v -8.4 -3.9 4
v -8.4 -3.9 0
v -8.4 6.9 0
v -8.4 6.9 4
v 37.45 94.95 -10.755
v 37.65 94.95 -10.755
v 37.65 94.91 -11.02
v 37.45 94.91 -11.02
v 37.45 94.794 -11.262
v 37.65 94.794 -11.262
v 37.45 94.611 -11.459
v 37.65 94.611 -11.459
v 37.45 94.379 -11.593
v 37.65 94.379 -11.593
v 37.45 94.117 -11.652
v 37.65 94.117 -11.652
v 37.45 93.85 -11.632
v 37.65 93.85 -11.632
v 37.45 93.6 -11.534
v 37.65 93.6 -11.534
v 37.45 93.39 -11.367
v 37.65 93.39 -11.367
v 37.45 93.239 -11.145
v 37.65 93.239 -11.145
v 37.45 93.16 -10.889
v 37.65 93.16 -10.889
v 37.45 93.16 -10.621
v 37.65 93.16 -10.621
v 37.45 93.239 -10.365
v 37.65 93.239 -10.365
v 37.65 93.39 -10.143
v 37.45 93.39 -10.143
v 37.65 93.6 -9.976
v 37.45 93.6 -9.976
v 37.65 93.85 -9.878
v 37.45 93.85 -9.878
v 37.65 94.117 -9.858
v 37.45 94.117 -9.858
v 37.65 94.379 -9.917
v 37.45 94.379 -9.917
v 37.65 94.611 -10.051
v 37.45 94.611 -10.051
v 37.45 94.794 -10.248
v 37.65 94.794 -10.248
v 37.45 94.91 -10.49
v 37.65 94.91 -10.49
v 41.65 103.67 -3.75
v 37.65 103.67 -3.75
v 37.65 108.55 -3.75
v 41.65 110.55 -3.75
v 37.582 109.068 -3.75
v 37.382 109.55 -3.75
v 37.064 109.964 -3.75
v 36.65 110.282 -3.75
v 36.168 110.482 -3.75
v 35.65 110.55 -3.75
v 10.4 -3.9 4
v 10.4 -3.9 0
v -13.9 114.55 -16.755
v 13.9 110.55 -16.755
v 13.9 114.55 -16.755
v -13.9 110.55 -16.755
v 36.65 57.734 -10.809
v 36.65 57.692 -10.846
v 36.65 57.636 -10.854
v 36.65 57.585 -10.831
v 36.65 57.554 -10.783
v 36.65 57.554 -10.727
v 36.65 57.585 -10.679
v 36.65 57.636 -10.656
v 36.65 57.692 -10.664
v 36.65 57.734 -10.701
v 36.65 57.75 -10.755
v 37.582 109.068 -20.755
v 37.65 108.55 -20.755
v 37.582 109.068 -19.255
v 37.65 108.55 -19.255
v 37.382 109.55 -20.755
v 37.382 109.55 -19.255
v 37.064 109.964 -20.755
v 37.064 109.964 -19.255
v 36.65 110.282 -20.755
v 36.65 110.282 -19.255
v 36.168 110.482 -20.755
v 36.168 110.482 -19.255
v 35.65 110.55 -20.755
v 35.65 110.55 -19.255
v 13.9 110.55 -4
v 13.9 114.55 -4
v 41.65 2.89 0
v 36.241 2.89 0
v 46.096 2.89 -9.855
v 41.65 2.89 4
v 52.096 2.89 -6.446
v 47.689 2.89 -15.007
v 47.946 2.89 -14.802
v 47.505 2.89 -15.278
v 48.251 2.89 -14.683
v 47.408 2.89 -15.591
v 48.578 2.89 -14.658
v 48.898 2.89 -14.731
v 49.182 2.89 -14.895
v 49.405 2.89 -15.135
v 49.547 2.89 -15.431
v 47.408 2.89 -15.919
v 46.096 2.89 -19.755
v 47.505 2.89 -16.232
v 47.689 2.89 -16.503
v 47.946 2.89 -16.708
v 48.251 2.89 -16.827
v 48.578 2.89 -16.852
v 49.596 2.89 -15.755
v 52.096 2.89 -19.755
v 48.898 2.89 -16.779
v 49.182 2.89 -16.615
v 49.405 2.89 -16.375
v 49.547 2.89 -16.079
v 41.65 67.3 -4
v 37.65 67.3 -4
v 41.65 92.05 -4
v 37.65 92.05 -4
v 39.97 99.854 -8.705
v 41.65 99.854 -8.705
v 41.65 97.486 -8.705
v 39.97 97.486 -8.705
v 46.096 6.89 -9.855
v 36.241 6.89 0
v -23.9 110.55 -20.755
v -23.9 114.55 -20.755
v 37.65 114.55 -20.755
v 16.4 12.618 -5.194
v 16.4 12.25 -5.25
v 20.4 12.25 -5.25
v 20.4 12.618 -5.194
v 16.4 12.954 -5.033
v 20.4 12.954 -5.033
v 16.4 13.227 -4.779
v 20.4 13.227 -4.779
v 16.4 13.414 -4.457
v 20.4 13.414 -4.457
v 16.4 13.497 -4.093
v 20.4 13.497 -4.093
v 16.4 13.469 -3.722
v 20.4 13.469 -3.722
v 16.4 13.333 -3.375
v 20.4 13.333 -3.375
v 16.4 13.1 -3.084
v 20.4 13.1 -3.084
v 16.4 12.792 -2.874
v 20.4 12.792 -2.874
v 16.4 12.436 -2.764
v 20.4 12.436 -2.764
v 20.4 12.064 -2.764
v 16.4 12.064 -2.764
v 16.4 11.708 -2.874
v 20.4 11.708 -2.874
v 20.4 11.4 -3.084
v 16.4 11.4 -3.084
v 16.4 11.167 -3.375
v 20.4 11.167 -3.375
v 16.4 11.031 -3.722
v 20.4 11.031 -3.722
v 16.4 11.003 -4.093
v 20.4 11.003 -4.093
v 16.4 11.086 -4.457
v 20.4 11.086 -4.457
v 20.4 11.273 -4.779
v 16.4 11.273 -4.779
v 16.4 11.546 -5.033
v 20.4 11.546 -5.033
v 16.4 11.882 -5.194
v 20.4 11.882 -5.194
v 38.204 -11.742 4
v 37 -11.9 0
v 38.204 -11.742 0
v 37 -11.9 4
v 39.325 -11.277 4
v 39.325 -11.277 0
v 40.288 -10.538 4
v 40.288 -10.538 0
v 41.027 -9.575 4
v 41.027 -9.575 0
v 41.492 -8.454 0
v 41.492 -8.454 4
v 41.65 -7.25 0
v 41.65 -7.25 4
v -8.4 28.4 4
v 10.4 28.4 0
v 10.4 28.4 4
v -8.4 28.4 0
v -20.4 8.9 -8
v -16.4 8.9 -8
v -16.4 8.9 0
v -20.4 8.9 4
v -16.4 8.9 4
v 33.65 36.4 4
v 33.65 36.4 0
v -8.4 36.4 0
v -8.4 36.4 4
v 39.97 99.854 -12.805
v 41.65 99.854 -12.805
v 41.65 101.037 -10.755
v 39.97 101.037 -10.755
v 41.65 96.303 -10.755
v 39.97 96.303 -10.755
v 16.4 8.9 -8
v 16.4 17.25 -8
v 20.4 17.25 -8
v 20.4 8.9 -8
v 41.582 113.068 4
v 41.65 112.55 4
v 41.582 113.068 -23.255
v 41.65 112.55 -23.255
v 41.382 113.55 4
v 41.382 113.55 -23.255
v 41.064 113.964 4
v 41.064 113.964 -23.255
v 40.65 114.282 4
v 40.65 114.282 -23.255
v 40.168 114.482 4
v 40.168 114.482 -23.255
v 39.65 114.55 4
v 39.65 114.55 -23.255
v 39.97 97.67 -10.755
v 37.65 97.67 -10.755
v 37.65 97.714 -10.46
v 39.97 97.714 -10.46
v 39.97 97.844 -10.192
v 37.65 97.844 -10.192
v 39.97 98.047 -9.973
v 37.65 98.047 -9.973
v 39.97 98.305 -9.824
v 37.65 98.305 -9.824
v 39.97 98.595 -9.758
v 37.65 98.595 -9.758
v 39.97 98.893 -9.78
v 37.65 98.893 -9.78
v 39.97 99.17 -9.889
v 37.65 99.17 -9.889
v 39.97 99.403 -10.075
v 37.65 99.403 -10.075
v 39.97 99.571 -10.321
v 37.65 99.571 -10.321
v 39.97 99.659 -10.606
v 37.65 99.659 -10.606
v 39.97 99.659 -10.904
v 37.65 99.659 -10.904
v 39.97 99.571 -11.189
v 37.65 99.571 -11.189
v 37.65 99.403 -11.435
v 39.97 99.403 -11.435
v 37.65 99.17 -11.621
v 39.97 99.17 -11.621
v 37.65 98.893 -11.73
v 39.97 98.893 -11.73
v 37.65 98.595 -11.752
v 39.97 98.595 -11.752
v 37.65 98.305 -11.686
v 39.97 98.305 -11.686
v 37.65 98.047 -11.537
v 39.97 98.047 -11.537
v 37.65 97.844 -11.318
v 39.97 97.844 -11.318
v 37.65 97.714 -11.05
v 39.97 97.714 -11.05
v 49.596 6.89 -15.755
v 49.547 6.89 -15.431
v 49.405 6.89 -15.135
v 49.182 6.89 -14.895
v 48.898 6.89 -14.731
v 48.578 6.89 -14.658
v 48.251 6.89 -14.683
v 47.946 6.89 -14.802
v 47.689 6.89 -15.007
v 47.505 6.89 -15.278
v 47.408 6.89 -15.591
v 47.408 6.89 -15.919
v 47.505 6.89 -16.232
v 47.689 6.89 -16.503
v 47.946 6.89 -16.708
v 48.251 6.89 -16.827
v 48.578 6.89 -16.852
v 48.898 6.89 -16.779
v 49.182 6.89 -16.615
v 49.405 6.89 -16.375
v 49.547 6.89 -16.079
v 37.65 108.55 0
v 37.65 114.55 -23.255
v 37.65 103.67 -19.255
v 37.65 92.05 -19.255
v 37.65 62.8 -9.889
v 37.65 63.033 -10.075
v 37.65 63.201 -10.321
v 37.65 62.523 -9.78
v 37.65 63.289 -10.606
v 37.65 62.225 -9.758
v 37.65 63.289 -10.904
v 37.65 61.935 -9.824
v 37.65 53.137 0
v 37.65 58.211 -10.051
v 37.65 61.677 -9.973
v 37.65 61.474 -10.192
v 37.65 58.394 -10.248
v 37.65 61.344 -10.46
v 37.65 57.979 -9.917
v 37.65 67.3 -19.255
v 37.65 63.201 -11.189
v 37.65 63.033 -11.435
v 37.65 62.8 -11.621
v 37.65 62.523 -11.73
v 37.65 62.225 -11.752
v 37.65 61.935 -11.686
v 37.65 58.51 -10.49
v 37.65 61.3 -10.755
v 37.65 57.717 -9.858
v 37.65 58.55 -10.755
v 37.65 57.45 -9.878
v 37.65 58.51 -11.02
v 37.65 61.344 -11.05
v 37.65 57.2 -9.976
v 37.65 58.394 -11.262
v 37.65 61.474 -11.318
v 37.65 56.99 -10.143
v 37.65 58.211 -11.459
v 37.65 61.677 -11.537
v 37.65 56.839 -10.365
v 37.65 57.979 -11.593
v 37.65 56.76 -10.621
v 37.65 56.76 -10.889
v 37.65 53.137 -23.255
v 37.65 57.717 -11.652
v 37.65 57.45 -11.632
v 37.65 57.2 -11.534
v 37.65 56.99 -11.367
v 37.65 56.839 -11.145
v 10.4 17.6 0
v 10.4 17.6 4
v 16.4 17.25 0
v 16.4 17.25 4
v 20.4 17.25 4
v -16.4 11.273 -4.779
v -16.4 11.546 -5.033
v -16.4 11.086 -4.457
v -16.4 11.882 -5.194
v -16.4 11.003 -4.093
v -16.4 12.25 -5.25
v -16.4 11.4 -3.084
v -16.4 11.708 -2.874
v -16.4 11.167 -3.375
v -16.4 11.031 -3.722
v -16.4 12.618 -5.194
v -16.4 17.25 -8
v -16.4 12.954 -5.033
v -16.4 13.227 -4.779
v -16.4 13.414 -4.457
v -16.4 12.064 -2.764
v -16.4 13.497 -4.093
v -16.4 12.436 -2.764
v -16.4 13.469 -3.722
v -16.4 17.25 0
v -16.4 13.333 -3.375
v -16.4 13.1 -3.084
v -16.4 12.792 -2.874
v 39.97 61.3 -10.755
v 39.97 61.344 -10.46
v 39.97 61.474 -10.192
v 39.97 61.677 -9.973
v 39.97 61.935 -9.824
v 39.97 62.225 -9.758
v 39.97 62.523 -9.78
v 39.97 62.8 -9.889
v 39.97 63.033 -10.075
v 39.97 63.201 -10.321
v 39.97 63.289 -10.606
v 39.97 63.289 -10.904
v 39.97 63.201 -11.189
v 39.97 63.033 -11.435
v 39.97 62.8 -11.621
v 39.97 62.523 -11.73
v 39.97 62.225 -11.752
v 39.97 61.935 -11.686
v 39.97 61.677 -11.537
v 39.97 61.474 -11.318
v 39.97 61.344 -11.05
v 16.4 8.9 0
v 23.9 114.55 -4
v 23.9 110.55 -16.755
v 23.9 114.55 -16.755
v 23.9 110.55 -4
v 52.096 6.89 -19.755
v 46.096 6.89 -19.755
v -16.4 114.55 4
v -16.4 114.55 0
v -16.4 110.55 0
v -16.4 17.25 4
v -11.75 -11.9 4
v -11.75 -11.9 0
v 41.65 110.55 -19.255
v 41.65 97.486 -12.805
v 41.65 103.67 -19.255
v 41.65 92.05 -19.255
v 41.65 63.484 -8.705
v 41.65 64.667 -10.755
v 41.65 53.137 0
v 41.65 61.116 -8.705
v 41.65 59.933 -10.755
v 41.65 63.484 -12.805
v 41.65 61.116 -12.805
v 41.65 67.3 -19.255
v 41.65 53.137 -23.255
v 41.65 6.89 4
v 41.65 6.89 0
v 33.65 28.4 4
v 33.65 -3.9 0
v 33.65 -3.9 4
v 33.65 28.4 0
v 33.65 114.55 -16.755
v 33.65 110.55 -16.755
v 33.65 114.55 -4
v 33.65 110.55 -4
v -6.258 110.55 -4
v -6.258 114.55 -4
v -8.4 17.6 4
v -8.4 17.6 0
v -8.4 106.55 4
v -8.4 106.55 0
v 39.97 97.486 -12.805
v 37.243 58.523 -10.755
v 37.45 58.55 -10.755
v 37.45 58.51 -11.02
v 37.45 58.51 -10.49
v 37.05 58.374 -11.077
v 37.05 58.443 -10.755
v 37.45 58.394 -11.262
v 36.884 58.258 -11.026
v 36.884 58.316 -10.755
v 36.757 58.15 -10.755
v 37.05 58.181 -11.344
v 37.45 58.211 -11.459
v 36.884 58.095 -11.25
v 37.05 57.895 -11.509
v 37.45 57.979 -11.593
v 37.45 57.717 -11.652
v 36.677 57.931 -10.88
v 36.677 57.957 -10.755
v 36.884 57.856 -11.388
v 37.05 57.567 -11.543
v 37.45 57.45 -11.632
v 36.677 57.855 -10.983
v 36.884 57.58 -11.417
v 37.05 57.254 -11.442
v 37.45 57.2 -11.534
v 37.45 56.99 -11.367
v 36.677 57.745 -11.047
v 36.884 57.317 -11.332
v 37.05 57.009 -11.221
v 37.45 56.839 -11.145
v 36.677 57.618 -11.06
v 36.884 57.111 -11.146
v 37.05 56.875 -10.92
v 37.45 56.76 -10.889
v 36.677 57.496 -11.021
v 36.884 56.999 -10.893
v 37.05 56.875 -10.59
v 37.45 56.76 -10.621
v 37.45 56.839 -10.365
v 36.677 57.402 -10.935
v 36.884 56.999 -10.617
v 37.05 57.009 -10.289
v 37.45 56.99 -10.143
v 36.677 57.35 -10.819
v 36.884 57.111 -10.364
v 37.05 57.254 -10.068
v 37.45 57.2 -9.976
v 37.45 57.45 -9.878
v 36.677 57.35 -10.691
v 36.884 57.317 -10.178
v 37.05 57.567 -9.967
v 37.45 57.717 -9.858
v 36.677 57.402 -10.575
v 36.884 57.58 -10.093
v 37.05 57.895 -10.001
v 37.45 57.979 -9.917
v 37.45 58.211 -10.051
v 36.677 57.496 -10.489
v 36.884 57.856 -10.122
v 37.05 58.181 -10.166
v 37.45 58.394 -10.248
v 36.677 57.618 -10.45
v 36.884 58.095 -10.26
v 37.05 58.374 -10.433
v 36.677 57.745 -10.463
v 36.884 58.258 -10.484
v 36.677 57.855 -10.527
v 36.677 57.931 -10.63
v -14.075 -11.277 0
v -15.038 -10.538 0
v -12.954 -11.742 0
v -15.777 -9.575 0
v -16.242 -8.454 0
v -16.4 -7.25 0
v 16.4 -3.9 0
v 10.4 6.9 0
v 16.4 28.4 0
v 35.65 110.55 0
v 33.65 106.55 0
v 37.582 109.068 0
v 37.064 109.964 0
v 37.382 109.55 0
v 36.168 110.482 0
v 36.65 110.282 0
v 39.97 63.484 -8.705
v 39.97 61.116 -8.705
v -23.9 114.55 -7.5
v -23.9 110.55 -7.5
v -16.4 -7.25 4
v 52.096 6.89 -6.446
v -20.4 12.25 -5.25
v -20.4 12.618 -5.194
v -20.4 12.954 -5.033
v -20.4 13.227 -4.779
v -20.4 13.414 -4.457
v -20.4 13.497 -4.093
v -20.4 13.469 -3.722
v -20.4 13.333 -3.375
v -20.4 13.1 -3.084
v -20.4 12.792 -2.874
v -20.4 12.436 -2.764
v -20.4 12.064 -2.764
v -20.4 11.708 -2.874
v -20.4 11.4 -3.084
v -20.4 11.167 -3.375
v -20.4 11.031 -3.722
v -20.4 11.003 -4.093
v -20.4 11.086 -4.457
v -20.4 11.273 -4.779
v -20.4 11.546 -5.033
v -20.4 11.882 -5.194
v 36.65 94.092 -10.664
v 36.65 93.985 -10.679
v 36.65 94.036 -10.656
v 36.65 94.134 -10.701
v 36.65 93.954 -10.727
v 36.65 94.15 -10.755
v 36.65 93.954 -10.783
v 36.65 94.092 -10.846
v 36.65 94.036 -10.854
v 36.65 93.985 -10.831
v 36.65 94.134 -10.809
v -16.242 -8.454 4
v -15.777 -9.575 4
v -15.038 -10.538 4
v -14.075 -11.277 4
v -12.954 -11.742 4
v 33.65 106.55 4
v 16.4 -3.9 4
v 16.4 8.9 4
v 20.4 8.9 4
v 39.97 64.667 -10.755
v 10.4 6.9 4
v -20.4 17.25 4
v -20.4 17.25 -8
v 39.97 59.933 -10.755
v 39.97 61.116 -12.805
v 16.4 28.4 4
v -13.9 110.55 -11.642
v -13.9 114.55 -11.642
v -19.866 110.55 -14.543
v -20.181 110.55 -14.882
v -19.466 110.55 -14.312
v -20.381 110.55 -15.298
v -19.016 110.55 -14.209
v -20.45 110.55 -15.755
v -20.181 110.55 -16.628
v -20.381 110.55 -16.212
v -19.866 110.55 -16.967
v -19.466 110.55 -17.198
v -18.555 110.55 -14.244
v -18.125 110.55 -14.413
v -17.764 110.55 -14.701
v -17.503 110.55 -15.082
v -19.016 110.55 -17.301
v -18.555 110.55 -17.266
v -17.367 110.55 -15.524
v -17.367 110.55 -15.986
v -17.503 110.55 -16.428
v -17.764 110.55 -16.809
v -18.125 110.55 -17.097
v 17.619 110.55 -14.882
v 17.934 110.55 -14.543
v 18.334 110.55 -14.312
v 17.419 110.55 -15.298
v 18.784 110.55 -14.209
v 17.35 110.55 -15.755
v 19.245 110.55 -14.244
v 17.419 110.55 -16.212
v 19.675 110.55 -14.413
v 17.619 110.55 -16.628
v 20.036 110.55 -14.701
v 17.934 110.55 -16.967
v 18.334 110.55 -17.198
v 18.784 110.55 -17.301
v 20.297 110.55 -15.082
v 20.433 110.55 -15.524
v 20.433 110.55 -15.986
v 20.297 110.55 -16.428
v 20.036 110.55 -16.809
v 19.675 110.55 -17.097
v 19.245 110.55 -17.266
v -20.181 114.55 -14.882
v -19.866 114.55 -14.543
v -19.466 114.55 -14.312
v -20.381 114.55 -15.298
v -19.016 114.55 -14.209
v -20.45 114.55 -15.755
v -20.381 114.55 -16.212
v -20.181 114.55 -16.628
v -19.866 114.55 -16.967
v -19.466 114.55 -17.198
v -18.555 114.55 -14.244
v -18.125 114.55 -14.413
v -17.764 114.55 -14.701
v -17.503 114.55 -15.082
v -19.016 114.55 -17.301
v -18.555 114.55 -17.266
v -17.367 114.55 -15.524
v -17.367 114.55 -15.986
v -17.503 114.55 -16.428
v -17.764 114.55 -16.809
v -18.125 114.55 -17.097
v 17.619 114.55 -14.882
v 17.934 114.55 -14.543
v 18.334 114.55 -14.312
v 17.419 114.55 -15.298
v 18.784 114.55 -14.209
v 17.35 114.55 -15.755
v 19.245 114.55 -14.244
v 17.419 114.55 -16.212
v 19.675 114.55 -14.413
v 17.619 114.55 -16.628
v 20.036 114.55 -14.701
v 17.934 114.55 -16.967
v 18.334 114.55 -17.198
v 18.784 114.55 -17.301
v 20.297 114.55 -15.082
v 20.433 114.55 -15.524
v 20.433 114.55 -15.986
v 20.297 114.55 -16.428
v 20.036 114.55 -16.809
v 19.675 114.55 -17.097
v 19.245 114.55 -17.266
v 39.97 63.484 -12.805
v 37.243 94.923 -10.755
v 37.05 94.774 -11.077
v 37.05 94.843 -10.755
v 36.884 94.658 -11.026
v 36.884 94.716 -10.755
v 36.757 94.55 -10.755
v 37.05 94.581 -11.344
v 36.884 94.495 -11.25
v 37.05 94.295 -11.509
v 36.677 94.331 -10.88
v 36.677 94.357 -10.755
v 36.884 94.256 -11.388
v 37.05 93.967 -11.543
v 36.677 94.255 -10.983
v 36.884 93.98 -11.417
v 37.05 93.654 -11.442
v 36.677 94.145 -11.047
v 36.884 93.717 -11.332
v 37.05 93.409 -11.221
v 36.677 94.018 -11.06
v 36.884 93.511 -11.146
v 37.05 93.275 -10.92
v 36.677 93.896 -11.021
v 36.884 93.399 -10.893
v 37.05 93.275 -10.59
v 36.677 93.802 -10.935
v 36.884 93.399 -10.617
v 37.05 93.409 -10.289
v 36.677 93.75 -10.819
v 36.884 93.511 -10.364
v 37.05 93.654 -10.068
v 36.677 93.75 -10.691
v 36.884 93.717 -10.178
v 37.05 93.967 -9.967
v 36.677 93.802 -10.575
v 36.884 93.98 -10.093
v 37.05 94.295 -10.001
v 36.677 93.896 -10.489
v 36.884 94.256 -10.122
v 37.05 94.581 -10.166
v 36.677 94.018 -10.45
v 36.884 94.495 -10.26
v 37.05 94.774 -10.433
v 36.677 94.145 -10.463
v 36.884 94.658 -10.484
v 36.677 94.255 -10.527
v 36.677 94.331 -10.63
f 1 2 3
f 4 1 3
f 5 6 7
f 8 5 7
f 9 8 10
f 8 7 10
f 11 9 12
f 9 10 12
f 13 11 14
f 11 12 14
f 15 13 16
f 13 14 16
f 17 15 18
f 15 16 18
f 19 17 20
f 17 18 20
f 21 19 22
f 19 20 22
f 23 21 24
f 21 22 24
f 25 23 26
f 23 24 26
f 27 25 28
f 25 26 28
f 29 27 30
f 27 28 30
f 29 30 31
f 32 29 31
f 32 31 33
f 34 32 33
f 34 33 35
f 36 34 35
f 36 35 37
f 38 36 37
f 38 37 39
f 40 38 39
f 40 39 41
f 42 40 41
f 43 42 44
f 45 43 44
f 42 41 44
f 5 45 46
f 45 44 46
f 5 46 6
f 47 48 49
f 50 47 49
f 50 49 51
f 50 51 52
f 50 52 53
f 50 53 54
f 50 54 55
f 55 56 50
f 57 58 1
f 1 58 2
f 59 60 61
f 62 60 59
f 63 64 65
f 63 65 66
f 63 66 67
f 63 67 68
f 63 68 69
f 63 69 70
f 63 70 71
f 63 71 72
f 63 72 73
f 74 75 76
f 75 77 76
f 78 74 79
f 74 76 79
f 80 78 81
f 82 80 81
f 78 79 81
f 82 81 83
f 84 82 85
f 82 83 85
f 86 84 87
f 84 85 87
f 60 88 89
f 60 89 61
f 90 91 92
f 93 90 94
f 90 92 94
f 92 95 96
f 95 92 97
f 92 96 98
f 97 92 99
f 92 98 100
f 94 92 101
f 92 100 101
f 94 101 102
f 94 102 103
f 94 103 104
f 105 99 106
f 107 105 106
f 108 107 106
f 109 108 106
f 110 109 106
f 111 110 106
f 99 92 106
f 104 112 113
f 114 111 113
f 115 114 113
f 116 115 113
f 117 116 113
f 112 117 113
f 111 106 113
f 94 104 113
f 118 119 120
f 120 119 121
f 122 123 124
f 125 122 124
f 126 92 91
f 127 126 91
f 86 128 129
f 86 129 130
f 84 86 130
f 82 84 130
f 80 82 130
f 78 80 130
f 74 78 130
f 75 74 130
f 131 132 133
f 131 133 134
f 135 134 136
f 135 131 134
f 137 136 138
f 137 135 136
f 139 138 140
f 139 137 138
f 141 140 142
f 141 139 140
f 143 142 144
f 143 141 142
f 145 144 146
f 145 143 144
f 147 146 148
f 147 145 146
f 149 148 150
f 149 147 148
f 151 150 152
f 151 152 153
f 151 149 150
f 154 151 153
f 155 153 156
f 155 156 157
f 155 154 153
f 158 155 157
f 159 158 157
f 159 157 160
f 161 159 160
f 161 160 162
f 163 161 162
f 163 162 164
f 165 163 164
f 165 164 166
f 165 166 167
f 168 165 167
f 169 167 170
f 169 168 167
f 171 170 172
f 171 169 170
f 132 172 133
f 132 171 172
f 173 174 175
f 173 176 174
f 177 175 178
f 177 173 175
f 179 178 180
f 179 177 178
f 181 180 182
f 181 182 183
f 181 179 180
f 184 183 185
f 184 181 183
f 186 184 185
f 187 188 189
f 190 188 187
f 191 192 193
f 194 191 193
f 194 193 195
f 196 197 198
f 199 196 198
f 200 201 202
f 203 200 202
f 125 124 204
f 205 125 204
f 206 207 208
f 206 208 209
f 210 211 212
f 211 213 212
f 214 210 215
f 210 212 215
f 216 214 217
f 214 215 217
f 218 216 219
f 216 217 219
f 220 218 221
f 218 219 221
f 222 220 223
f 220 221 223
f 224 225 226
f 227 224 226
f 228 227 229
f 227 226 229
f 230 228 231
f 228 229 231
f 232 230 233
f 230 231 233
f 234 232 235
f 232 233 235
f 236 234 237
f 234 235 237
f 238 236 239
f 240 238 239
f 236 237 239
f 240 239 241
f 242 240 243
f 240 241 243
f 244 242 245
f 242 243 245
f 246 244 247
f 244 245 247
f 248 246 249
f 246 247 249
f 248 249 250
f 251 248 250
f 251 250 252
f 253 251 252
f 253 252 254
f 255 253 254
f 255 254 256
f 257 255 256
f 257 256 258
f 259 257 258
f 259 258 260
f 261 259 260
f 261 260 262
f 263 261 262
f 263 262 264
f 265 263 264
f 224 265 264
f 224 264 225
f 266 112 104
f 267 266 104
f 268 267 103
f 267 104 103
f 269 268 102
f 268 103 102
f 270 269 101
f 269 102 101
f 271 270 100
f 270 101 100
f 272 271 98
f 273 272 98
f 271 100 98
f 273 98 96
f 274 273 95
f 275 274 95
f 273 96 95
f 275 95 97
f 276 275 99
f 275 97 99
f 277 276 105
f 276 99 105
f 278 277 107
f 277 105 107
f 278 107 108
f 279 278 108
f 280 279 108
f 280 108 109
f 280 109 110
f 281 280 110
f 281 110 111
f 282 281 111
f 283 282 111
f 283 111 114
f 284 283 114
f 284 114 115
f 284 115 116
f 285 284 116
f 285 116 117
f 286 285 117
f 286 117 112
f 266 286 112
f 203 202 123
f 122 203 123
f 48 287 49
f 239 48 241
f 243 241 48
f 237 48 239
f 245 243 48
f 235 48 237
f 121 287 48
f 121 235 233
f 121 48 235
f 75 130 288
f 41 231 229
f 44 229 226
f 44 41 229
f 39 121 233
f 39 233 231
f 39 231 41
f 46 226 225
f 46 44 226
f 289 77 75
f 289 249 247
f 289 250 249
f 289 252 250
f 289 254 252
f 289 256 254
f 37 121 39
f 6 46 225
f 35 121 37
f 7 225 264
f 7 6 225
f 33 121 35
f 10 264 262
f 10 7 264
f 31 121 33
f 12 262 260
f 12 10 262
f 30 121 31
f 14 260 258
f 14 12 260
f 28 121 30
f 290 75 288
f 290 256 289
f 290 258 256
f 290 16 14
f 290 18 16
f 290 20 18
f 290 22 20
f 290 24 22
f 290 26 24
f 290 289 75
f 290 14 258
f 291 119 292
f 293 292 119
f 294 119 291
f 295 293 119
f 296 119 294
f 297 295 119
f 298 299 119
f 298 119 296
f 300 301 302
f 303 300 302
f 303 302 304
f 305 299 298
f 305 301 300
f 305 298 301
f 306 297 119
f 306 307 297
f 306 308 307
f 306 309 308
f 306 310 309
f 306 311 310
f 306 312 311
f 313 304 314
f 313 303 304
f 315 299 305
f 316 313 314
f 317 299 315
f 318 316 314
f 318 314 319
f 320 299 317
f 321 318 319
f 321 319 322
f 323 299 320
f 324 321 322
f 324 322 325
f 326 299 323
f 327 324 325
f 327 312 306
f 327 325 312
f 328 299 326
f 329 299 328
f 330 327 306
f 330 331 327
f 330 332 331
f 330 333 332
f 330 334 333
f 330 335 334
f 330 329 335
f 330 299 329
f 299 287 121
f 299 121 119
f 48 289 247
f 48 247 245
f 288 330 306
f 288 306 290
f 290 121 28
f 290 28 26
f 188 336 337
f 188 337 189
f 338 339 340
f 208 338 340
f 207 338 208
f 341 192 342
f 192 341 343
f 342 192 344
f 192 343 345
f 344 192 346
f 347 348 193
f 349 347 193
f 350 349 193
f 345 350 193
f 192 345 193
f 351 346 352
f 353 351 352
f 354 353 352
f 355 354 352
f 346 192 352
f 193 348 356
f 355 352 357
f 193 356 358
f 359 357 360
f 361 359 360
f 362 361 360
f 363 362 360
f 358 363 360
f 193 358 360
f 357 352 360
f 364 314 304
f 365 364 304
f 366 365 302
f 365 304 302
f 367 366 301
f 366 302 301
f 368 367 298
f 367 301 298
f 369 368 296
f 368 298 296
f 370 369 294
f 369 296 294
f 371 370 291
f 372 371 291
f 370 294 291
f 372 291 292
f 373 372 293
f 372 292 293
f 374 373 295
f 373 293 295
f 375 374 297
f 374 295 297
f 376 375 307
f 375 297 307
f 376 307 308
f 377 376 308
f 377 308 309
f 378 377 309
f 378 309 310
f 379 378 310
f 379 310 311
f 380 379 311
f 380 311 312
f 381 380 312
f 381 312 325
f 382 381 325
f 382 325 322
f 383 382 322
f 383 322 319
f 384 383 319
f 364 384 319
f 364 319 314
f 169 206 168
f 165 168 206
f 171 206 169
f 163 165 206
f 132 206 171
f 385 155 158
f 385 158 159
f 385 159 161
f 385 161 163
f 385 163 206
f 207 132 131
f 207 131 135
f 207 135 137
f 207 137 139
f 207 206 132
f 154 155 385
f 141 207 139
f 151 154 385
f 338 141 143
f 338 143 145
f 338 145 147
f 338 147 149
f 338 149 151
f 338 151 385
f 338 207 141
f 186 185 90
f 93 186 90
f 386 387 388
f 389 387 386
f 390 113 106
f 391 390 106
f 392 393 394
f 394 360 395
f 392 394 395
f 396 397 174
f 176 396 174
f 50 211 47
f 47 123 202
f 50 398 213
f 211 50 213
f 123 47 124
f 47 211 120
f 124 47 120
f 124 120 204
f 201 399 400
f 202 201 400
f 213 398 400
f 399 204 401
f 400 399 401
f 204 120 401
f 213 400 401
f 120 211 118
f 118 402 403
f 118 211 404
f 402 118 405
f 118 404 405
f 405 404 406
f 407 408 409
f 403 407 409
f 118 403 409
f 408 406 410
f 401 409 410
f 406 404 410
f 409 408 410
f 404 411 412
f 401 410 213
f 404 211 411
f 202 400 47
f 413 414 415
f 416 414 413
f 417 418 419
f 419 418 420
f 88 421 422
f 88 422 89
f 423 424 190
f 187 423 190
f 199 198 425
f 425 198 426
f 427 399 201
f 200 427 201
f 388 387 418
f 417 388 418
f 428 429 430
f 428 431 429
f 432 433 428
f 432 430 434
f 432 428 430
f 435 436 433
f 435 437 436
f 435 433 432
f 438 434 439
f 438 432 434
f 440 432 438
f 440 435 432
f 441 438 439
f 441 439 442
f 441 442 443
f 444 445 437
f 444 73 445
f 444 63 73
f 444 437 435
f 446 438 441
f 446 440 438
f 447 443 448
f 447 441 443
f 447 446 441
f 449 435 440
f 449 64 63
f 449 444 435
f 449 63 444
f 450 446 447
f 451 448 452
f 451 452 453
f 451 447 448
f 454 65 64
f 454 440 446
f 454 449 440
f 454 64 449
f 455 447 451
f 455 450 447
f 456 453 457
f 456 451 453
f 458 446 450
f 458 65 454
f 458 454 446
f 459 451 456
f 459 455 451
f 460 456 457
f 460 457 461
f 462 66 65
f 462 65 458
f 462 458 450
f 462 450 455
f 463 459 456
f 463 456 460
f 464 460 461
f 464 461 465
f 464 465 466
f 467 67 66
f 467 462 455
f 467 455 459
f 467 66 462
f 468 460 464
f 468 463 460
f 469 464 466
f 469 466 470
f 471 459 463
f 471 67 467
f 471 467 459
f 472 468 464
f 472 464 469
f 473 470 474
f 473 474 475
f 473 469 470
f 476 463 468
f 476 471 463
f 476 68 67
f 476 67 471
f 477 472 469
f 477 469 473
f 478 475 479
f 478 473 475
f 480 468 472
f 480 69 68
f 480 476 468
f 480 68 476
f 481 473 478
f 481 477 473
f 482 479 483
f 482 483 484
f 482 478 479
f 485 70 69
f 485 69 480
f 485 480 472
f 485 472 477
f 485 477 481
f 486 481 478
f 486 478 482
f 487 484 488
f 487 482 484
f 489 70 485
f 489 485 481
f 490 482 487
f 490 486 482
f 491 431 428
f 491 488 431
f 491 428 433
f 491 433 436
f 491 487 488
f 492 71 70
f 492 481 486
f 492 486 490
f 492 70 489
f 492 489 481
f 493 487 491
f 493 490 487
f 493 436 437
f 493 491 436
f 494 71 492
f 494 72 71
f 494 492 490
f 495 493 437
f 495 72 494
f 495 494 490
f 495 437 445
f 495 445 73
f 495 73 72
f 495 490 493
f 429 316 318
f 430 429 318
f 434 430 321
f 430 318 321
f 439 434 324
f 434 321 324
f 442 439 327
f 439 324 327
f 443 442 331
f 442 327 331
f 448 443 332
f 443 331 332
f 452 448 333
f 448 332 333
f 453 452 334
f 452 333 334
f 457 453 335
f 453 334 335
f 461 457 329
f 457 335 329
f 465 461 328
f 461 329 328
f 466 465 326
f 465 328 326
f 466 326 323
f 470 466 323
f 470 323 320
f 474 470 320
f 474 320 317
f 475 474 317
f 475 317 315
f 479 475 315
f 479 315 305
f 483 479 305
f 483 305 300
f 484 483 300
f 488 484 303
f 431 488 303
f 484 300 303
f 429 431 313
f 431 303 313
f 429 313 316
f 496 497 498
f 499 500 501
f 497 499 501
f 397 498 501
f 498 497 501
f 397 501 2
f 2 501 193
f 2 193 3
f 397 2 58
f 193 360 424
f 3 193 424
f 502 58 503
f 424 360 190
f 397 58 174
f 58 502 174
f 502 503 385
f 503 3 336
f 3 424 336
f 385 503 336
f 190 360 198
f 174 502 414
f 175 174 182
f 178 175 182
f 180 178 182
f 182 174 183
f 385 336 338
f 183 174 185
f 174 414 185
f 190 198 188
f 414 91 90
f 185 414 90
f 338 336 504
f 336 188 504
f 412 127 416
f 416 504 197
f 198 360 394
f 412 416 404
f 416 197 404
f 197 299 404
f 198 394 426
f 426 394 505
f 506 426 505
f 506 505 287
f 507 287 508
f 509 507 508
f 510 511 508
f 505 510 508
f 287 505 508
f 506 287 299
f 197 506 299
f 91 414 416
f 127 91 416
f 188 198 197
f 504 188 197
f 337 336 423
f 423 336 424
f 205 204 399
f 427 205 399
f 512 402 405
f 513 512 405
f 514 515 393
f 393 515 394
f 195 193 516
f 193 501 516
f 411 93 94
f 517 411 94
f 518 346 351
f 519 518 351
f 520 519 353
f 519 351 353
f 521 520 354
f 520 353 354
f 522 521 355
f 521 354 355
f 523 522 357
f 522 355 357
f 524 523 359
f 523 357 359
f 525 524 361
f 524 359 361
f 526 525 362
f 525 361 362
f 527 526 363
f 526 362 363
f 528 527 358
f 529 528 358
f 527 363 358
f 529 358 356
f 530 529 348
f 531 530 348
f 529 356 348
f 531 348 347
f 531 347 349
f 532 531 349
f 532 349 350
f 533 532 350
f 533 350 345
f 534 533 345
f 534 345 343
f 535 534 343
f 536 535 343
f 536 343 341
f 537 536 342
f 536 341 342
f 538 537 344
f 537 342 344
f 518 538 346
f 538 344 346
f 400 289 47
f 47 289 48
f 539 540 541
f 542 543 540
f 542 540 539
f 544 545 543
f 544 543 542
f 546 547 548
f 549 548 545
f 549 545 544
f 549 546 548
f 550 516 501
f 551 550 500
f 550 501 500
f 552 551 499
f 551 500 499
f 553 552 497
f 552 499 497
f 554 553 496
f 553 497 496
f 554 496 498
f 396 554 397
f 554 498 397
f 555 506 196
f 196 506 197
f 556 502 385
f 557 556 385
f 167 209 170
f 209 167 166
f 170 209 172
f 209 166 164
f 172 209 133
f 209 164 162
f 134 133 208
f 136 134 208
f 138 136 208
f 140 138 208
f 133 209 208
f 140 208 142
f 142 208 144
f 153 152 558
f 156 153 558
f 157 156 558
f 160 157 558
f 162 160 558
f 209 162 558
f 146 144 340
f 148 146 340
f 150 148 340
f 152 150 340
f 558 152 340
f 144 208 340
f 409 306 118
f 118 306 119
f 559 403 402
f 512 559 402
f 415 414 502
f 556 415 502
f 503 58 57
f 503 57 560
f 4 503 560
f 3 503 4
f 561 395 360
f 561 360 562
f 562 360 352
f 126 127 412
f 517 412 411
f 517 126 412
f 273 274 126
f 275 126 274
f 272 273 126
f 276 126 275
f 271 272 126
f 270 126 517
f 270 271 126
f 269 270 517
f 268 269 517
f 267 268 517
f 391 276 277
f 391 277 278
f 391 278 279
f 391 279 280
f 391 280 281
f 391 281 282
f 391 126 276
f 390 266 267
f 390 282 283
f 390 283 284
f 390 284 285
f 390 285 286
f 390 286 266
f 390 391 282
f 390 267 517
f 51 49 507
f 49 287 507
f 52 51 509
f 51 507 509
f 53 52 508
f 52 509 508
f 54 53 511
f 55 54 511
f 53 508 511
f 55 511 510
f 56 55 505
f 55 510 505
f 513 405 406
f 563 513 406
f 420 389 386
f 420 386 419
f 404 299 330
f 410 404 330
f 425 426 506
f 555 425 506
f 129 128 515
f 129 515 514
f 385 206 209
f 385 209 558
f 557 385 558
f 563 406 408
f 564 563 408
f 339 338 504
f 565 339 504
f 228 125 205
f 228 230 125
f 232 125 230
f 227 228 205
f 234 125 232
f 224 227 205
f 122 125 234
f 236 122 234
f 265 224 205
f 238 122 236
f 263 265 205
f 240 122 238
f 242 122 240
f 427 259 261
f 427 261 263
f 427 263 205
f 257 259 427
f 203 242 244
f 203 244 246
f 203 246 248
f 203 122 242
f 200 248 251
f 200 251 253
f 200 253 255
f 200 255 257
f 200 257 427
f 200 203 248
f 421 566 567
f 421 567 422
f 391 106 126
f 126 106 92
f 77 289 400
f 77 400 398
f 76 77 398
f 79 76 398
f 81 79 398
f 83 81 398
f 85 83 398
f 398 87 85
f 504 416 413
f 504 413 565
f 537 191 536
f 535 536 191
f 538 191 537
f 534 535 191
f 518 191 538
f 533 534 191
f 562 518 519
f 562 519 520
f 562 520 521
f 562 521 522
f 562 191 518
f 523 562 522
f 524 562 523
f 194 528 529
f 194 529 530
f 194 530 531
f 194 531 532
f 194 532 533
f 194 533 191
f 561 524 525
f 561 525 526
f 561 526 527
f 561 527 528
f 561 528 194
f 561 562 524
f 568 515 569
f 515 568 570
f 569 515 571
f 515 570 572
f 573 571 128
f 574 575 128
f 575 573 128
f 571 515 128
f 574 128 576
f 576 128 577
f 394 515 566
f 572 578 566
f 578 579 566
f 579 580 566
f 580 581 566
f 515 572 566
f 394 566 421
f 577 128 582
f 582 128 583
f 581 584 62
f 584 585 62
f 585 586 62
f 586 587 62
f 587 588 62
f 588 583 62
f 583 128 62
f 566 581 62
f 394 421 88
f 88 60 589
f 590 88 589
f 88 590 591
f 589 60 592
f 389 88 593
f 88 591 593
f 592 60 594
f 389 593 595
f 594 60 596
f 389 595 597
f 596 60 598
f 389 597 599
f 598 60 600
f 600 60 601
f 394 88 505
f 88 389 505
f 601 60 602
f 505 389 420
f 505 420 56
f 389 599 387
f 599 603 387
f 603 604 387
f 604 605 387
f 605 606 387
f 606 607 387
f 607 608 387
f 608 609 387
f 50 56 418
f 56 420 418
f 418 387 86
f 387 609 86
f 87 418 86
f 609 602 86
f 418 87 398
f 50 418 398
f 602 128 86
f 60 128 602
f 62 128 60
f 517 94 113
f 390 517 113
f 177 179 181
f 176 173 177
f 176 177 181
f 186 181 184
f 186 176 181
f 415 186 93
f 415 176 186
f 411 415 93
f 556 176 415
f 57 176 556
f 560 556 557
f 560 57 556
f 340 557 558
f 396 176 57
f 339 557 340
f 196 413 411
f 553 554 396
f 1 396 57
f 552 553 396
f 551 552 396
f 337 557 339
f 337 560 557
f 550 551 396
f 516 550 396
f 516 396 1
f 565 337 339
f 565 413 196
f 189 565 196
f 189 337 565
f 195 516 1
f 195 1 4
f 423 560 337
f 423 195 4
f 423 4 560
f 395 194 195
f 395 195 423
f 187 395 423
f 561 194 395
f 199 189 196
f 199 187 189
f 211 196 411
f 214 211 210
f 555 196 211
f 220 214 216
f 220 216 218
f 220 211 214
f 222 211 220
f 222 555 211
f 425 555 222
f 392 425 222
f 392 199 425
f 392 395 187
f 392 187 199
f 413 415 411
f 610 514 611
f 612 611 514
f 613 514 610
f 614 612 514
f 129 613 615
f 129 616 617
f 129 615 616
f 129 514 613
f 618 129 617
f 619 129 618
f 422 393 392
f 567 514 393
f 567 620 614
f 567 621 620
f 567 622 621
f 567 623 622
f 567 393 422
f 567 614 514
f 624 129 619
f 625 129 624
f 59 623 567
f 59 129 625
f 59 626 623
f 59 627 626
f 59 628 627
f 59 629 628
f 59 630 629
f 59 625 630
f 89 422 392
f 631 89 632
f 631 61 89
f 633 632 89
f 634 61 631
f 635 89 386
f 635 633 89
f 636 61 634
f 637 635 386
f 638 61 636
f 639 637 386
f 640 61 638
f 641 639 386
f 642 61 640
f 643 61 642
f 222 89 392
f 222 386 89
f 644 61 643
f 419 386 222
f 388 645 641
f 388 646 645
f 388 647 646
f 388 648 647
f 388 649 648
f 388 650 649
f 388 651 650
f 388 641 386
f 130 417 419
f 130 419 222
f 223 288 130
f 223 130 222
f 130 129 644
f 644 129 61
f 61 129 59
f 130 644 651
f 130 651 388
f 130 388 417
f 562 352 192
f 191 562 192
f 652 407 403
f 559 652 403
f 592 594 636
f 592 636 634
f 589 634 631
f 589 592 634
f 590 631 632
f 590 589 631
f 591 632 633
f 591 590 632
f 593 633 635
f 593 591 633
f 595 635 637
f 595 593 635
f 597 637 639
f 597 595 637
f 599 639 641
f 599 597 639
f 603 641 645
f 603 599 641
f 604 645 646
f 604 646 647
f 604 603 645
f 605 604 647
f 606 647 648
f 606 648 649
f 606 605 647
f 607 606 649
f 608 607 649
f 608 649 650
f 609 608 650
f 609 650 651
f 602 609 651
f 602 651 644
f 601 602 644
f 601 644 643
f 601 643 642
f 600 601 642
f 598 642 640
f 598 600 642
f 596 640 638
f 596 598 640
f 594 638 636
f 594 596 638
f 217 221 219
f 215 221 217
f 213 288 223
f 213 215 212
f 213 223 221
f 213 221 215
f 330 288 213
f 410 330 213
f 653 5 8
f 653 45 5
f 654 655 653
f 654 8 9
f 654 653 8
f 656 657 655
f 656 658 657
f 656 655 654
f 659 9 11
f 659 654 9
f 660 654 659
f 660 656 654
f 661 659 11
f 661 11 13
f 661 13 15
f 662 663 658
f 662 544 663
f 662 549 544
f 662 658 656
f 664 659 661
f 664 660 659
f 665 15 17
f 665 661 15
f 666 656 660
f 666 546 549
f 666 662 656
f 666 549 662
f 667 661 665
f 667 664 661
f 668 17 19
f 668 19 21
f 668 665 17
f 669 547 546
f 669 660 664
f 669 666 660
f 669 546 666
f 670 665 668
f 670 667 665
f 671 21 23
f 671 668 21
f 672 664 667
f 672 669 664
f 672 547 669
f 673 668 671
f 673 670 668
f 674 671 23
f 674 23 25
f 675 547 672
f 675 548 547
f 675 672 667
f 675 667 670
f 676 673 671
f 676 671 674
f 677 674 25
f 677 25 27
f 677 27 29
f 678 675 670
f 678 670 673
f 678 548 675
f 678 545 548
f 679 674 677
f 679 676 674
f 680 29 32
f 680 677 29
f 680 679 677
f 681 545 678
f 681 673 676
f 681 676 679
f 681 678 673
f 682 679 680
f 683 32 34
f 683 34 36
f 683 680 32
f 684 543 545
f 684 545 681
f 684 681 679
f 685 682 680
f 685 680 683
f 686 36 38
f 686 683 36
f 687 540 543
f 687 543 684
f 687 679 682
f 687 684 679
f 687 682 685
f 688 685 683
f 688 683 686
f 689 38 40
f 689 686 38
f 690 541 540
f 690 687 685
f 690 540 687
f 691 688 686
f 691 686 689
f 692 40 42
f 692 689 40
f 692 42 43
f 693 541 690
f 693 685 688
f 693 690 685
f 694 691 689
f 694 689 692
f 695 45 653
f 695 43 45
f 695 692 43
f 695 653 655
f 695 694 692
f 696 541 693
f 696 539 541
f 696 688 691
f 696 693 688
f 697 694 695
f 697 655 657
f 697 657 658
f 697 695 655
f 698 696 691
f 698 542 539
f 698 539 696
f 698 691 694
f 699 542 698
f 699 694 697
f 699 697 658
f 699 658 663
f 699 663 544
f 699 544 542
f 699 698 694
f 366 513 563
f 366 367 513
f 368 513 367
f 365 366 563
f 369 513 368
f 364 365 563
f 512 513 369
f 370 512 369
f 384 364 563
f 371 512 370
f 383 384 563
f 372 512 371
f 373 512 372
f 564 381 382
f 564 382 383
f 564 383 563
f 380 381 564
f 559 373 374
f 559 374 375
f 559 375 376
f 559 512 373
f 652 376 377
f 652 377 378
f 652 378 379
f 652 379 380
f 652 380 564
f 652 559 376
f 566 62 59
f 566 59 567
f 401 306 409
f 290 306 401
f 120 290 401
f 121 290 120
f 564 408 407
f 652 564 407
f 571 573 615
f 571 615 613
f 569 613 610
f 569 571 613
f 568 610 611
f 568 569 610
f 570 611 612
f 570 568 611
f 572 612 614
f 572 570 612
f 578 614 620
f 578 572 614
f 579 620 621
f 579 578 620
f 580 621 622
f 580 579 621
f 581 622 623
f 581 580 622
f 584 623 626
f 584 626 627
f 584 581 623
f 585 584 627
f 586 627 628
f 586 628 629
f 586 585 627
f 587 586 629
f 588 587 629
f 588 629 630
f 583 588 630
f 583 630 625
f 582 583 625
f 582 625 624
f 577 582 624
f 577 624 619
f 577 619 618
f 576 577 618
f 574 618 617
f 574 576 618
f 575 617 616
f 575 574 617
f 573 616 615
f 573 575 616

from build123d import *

# Parameters (mm, degrees)
EXTRUDE_5_DEPTH      = 4
SKETCH_5_W           = 65.55
SKETCH_5_H           = 20.755
SKETCH_5_R           = 1.55
EXTRUDE_6_DEPTH      = 4
SKETCH_7_W           = 65.55
SKETCH_7_H           = 126.45
EXTRUDE_8_DEPTH      = 4
SKETCH_11_W          = 17.25
SKETCH_11_H          = 32.3
SKETCH_11_W_2        = 18.8
SKETCH_11_H_2        = 10.8
CUT_EXTRUDE_3_DEPTH  = 125.085535116
EXTRUDE_9_DEPTH      = 4
CUT_EXTRUDE_4_DEPTH  = 10
SKETCH_14_W          = 9.75
SKETCH_14_H          = 12.755
CUT_EXTRUDE_5_DEPTH  = 10
SKETCH_16_W          = 15.255
SKETCH_16_H          = 24.75
SKETCH_16_W_2        = 15.505
SKETCH_16_H_2        = 6.88
CUT_EXTRUDE_6_DEPTH  = 133.101854737
EXTRUDE_2_DEPTH      = 4
CUT_EXTRUDE_7_REACH  = 127.39
SKETCH_19_R          = 1.1
SKETCH_21_W          = 4
SKETCH_21_H          = 2.5
EXTRUDE_11_DEPTH     = 4
FILLET_2_R           = 2
FILLET_3_R           = 4.65
SKETCH_24_R          = 1
CUT_EXTRUDE_10_DEPTH = 133.101854737
SKETCH_25_R          = 0.9
EXTRUDE_12_DEPTH     = 1
FILLET_4_R           = 0.8
CUT_EXTRUDE_11_DEPTH = 1.68


with BuildPart() as part:
    # 草图4 → 凸台-拉伸5 (new body)
    with BuildSketch(Plane(origin=(37.65, 0, 0), x_dir=(0, 0, -1), z_dir=(1, 0, 0))):
        Polygon((23.255, 110.55), (19.873443934, 110.55), (11.636556066, 110.55), (0, 110.55), (0, 53.1366), (23.255, 53.1366), align=None)
    extrude(amount=EXTRUDE_5_DEPTH)

    # 草图5 → 凸台-拉伸6 (add)
    with BuildSketch(Plane(origin=(0, 110.55, 0), x_dir=(1, 0, 0), z_dir=(0, 1, 0))):
        with Locations((8.875, 10.3775)):
            Rectangle(SKETCH_5_W, SKETCH_5_H)
        with Locations(Location((-18.9, 15.755, 0), (0, 0, 180))):
            Circle(SKETCH_5_R, mode=Mode.SUBTRACT)
        with Locations(Location((18.9, 15.755, 0), (0, 0, 180))):
            Circle(SKETCH_5_R, mode=Mode.SUBTRACT)
    extrude(amount=EXTRUDE_6_DEPTH)

    # 草图7 → 凸台-拉伸8 (add)
    with BuildSketch(Plane.XY):
        with Locations((8.875, 51.325)):
            Rectangle(SKETCH_7_W, SKETCH_7_H)
    extrude(amount=EXTRUDE_8_DEPTH)

    # 草图11 → 切除-拉伸3 (cut, through all)
    with BuildSketch(Plane(origin=(0, 0, 0), x_dir=(-1, 0, 0), z_dir=(0, 0, -1))):
        with Locations((-25.025, 12.25)):
            Rectangle(SKETCH_11_W, SKETCH_11_H)
        Polygon((-33.65, 106.55), (-33.65, 36.4), (-16.4, 36.4), (8.4, 36.4), (8.4, 106.55), align=None)
        with Locations((-1, 1.5)):
            Rectangle(SKETCH_11_W_2, SKETCH_11_H_2)
        with Locations((-1, 23)):
            Rectangle(SKETCH_11_W_2, SKETCH_11_H_2)
        with BuildLine():
            ThreePointArc((16.4, -7.25), (15.038046533, -10.538046533), (11.75, -11.9))
            Line((11.75, -11.9), (23.9, -11.9))
            Line((23.9, -11.9), (23.9, 106.55))
            Line((23.9, 106.55), (16.4, 106.55))
            Line((16.4, 106.55), (16.4, -7.25))
        make_face()
    extrude(amount=-CUT_EXTRUDE_3_DEPTH, mode=Mode.SUBTRACT)

    # 草图12 → 凸台-拉伸9 (add)
    with BuildSketch(Plane(origin=(0, 2.890336251, 0), x_dir=(1, 0, 0), z_dir=(0, 1, 0))):
        Polygon((52.095757056, 19.755), (46.095757056, 19.755), (46.095757056, 9.855), (36.240757056, 0), (41.65, -4), (52.095757056, 6.445757056), align=None)
    extrude(amount=EXTRUDE_9_DEPTH)

    # 草图13 → 切除-拉伸4 (cut, symmetric)
    with BuildSketch(Plane.XZ.offset(-110.55)):
        Polygon((-23.9, -7.5), (-16.4, 0), (-16.4, 4), (-23.9, 4), align=None)
    extrude(amount=CUT_EXTRUDE_4_DEPTH, both=True, mode=Mode.SUBTRACT)

    # 草图14 → 切除-拉伸5 (cut)
    with BuildSketch(Plane.XZ.offset(-110.55)):
        with Locations((28.775, -10.3775)):
            Rectangle(SKETCH_14_W, SKETCH_14_H)
        Polygon((13.9, -16.755), (-13.9, -16.755), (-13.9, -11.642135624), (-6.257864376, -4), (13.9, -4), align=None)
    extrude(amount=-CUT_EXTRUDE_5_DEPTH, mode=Mode.SUBTRACT)

    # 草图16 → 切除-拉伸6 (cut, through all)
    with BuildSketch(Plane.ZY.offset(-37.65)):
        with Locations((-11.6275, 79.675)):
            Rectangle(SKETCH_16_W, SKETCH_16_H)
        with Locations((-11.5025, 107.11)):
            Rectangle(SKETCH_16_W_2, SKETCH_16_H_2)
    extrude(amount=-CUT_EXTRUDE_6_DEPTH, mode=Mode.SUBTRACT)

    # 草图2 → 凸台-拉伸2 (add)
    with BuildSketch(Plane.ZY.offset(16.4)):
        Polygon((-8, 12.25), (-8, 8.9), (4, 8.9), (4, 17.25), (-8, 17.25), align=None)
        with BuildLine():
            ThreePointArc((-2.75, 12.25), (-4, 11), (-5.25, 12.25))
            ThreePointArc((-5.25, 12.25), (-4, 13.5), (-2.75, 12.25))
        make_face(mode=Mode.SUBTRACT)
    extrude_2 = extrude(amount=EXTRUDE_2_DEPTH)

    # 镜向10: 凸台-拉伸2 across plane
    add(extrude_2.mirror(Plane(origin=(0, 0, 0), x_dir=(0, 0, 1), z_dir=(1, 0, 0))))

    # 草图19 → 切除-拉伸7 (cut, up to next)
    with BuildSketch(Plane.XZ.offset(-2.890336251), mode=Mode.PRIVATE) as cut_extrude_7_sk1:
        with Locations((48.495757056, -15.755)):
            Circle(SKETCH_19_R)
    cut_extrude_7_tool1 = extrude(cut_extrude_7_sk1.sketch, amount=-CUT_EXTRUDE_7_REACH, mode=Mode.PRIVATE) & part.part
    add(cut_extrude_7_tool1.solids().sort_by_distance((48.495757, 2.890336, -15.755))[0], mode=Mode.SUBTRACT)

    # 草图21 → 凸台-拉伸11 (add)
    with BuildSketch(Plane(origin=(0, 110.55, 0), x_dir=(1, 0, 0), z_dir=(0, 1, 0))):
        with Locations((39.65, 22.005)):
            Rectangle(SKETCH_21_W, SKETCH_21_H)
    extrude(amount=EXTRUDE_11_DEPTH)

    # 圆角2
    fillet_2_edges = [part.edges().sort_by_distance(p)[0] for p in [
        (37.65, 110.55, -20.005),
        (41.65, 114.55, -9.6275),
        (37.65, 110.55, -1.875),
    ]]
    fillet(fillet_2_edges, radius=FILLET_2_R)

    # 圆角3
    fillet_3_edges = [part.edges().sort_by_distance(p)[0] for p in [
        (41.65, -11.9, 2),
    ]]
    fillet(fillet_3_edges, radius=FILLET_3_R)

    # 草图24 → 切除-拉伸10 (cut, through all)
    with BuildSketch(Plane.ZY.offset(-37.65)):
        with Locations(Location((-10.755, 62.3, 0), (0, 0, 270))):
            Circle(SKETCH_24_R)
        with Locations(Location((-10.755, 98.67, 0), (0, 0, 270))):
            Circle(SKETCH_24_R)
    extrude(amount=-CUT_EXTRUDE_10_DEPTH, mode=Mode.SUBTRACT)

    # 草图25 → 凸台-拉伸12 (add)
    with BuildSketch(Plane.ZY.offset(-37.65)):
        with Locations(Location((-10.755, 57.65, 0), (0, 0, 90))):
            Circle(SKETCH_25_R)
        with Locations(Location((-10.755, 94.05, 0), (0, 0, 90))):
            Circle(SKETCH_25_R)
    extrude(amount=EXTRUDE_12_DEPTH)

    # 圆角4
    fillet_4_edges = [part.edges().sort_by_distance(p)[0] for p in [
        (36.65, 93.15, -10.755),
        (36.65, 56.75, -10.755),
    ]]
    fillet(fillet_4_edges, radius=FILLET_4_R)

    # 草图27 → 切除-拉伸11 (cut)
    with BuildSketch(Plane(origin=(41.65, 0, 0), x_dir=(0, 0, -1), z_dir=(1, 0, 0))):
        Polygon((10.755, 96.302863896), (12.805, 97.486431948), (12.805, 99.853568052), (10.755, 101.037136104), (8.705, 99.853568052), (8.705, 97.486431948), align=None)
        Polygon((10.755, 59.932863896), (12.805, 61.116431948), (12.805, 63.483568052), (10.755, 64.667136104), (8.705, 63.483568052), (8.705, 61.116431948), align=None)
    extrude(amount=-CUT_EXTRUDE_11_DEPTH, mode=Mode.SUBTRACT)


solid = part.part
